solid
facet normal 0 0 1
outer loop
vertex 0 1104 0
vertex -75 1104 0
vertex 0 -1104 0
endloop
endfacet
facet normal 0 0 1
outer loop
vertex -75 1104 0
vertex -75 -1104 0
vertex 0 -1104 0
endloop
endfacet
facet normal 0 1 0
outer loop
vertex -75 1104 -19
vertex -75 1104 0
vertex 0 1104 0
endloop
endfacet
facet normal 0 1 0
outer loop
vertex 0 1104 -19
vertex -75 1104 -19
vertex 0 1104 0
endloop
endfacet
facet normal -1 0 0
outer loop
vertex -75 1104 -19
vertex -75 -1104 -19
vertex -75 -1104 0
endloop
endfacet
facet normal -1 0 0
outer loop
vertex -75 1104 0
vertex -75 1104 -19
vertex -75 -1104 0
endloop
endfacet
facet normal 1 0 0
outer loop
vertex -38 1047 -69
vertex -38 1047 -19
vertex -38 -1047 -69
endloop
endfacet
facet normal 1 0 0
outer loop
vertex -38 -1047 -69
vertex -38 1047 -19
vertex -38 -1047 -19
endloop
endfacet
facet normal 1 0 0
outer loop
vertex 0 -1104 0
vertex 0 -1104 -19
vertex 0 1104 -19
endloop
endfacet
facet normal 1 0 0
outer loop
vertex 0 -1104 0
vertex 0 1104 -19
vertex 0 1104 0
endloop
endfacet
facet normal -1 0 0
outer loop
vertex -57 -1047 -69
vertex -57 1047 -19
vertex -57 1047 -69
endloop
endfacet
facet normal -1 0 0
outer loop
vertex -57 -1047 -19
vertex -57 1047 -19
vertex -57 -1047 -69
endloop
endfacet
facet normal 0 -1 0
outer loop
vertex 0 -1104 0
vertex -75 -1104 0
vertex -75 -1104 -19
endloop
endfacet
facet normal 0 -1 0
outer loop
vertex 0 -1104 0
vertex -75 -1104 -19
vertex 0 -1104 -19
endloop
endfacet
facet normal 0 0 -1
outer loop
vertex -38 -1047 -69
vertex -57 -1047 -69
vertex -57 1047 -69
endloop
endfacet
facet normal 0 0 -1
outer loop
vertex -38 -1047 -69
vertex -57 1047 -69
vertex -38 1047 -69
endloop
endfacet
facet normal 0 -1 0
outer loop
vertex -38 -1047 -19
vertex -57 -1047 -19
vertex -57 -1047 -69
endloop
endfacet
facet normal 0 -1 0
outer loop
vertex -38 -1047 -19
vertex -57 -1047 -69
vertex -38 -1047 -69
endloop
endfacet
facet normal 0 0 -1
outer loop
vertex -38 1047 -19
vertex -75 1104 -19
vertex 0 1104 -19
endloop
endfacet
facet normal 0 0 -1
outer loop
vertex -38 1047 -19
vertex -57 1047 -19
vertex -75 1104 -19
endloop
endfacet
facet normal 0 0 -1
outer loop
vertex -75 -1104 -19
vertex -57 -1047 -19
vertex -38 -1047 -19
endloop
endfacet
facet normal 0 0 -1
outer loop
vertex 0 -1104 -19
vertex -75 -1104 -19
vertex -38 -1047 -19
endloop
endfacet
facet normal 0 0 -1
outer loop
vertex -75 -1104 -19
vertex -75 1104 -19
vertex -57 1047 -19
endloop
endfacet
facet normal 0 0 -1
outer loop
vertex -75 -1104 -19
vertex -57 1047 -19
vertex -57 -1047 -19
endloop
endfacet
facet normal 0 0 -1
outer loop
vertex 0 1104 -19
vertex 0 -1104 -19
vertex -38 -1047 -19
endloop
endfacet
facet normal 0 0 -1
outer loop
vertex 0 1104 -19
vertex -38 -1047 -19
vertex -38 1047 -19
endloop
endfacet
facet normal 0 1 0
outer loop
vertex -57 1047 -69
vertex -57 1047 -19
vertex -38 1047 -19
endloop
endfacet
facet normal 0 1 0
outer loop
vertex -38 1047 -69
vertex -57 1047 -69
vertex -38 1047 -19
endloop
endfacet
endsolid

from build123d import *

# Parameters (mm, degrees)
F0_W     = 75
F0_H     = 19
F1_DEPTH = 1104
F2_W     = 19
F2_H     = 2094
F3_DEPTH = 50


with BuildPart() as f1:
    # F0 (on Front) → F1 (new body, symmetric)
    with BuildSketch(Plane.XZ):
        with Locations((-37.5, -9.5)):
            Rectangle(F0_W, F0_H)
    extrude(amount=F1_DEPTH, both=True)

    # F2 (on face) → F3 (join)
    with BuildSketch(Plane(origin=(0, 0, -19), x_dir=(1, 0, 0), z_dir=(0, 0, -1))):
        with Locations((-47.5, 0)):
            Rectangle(F2_W, F2_H)
    extrude(amount=F3_DEPTH)


solid = f1.part
